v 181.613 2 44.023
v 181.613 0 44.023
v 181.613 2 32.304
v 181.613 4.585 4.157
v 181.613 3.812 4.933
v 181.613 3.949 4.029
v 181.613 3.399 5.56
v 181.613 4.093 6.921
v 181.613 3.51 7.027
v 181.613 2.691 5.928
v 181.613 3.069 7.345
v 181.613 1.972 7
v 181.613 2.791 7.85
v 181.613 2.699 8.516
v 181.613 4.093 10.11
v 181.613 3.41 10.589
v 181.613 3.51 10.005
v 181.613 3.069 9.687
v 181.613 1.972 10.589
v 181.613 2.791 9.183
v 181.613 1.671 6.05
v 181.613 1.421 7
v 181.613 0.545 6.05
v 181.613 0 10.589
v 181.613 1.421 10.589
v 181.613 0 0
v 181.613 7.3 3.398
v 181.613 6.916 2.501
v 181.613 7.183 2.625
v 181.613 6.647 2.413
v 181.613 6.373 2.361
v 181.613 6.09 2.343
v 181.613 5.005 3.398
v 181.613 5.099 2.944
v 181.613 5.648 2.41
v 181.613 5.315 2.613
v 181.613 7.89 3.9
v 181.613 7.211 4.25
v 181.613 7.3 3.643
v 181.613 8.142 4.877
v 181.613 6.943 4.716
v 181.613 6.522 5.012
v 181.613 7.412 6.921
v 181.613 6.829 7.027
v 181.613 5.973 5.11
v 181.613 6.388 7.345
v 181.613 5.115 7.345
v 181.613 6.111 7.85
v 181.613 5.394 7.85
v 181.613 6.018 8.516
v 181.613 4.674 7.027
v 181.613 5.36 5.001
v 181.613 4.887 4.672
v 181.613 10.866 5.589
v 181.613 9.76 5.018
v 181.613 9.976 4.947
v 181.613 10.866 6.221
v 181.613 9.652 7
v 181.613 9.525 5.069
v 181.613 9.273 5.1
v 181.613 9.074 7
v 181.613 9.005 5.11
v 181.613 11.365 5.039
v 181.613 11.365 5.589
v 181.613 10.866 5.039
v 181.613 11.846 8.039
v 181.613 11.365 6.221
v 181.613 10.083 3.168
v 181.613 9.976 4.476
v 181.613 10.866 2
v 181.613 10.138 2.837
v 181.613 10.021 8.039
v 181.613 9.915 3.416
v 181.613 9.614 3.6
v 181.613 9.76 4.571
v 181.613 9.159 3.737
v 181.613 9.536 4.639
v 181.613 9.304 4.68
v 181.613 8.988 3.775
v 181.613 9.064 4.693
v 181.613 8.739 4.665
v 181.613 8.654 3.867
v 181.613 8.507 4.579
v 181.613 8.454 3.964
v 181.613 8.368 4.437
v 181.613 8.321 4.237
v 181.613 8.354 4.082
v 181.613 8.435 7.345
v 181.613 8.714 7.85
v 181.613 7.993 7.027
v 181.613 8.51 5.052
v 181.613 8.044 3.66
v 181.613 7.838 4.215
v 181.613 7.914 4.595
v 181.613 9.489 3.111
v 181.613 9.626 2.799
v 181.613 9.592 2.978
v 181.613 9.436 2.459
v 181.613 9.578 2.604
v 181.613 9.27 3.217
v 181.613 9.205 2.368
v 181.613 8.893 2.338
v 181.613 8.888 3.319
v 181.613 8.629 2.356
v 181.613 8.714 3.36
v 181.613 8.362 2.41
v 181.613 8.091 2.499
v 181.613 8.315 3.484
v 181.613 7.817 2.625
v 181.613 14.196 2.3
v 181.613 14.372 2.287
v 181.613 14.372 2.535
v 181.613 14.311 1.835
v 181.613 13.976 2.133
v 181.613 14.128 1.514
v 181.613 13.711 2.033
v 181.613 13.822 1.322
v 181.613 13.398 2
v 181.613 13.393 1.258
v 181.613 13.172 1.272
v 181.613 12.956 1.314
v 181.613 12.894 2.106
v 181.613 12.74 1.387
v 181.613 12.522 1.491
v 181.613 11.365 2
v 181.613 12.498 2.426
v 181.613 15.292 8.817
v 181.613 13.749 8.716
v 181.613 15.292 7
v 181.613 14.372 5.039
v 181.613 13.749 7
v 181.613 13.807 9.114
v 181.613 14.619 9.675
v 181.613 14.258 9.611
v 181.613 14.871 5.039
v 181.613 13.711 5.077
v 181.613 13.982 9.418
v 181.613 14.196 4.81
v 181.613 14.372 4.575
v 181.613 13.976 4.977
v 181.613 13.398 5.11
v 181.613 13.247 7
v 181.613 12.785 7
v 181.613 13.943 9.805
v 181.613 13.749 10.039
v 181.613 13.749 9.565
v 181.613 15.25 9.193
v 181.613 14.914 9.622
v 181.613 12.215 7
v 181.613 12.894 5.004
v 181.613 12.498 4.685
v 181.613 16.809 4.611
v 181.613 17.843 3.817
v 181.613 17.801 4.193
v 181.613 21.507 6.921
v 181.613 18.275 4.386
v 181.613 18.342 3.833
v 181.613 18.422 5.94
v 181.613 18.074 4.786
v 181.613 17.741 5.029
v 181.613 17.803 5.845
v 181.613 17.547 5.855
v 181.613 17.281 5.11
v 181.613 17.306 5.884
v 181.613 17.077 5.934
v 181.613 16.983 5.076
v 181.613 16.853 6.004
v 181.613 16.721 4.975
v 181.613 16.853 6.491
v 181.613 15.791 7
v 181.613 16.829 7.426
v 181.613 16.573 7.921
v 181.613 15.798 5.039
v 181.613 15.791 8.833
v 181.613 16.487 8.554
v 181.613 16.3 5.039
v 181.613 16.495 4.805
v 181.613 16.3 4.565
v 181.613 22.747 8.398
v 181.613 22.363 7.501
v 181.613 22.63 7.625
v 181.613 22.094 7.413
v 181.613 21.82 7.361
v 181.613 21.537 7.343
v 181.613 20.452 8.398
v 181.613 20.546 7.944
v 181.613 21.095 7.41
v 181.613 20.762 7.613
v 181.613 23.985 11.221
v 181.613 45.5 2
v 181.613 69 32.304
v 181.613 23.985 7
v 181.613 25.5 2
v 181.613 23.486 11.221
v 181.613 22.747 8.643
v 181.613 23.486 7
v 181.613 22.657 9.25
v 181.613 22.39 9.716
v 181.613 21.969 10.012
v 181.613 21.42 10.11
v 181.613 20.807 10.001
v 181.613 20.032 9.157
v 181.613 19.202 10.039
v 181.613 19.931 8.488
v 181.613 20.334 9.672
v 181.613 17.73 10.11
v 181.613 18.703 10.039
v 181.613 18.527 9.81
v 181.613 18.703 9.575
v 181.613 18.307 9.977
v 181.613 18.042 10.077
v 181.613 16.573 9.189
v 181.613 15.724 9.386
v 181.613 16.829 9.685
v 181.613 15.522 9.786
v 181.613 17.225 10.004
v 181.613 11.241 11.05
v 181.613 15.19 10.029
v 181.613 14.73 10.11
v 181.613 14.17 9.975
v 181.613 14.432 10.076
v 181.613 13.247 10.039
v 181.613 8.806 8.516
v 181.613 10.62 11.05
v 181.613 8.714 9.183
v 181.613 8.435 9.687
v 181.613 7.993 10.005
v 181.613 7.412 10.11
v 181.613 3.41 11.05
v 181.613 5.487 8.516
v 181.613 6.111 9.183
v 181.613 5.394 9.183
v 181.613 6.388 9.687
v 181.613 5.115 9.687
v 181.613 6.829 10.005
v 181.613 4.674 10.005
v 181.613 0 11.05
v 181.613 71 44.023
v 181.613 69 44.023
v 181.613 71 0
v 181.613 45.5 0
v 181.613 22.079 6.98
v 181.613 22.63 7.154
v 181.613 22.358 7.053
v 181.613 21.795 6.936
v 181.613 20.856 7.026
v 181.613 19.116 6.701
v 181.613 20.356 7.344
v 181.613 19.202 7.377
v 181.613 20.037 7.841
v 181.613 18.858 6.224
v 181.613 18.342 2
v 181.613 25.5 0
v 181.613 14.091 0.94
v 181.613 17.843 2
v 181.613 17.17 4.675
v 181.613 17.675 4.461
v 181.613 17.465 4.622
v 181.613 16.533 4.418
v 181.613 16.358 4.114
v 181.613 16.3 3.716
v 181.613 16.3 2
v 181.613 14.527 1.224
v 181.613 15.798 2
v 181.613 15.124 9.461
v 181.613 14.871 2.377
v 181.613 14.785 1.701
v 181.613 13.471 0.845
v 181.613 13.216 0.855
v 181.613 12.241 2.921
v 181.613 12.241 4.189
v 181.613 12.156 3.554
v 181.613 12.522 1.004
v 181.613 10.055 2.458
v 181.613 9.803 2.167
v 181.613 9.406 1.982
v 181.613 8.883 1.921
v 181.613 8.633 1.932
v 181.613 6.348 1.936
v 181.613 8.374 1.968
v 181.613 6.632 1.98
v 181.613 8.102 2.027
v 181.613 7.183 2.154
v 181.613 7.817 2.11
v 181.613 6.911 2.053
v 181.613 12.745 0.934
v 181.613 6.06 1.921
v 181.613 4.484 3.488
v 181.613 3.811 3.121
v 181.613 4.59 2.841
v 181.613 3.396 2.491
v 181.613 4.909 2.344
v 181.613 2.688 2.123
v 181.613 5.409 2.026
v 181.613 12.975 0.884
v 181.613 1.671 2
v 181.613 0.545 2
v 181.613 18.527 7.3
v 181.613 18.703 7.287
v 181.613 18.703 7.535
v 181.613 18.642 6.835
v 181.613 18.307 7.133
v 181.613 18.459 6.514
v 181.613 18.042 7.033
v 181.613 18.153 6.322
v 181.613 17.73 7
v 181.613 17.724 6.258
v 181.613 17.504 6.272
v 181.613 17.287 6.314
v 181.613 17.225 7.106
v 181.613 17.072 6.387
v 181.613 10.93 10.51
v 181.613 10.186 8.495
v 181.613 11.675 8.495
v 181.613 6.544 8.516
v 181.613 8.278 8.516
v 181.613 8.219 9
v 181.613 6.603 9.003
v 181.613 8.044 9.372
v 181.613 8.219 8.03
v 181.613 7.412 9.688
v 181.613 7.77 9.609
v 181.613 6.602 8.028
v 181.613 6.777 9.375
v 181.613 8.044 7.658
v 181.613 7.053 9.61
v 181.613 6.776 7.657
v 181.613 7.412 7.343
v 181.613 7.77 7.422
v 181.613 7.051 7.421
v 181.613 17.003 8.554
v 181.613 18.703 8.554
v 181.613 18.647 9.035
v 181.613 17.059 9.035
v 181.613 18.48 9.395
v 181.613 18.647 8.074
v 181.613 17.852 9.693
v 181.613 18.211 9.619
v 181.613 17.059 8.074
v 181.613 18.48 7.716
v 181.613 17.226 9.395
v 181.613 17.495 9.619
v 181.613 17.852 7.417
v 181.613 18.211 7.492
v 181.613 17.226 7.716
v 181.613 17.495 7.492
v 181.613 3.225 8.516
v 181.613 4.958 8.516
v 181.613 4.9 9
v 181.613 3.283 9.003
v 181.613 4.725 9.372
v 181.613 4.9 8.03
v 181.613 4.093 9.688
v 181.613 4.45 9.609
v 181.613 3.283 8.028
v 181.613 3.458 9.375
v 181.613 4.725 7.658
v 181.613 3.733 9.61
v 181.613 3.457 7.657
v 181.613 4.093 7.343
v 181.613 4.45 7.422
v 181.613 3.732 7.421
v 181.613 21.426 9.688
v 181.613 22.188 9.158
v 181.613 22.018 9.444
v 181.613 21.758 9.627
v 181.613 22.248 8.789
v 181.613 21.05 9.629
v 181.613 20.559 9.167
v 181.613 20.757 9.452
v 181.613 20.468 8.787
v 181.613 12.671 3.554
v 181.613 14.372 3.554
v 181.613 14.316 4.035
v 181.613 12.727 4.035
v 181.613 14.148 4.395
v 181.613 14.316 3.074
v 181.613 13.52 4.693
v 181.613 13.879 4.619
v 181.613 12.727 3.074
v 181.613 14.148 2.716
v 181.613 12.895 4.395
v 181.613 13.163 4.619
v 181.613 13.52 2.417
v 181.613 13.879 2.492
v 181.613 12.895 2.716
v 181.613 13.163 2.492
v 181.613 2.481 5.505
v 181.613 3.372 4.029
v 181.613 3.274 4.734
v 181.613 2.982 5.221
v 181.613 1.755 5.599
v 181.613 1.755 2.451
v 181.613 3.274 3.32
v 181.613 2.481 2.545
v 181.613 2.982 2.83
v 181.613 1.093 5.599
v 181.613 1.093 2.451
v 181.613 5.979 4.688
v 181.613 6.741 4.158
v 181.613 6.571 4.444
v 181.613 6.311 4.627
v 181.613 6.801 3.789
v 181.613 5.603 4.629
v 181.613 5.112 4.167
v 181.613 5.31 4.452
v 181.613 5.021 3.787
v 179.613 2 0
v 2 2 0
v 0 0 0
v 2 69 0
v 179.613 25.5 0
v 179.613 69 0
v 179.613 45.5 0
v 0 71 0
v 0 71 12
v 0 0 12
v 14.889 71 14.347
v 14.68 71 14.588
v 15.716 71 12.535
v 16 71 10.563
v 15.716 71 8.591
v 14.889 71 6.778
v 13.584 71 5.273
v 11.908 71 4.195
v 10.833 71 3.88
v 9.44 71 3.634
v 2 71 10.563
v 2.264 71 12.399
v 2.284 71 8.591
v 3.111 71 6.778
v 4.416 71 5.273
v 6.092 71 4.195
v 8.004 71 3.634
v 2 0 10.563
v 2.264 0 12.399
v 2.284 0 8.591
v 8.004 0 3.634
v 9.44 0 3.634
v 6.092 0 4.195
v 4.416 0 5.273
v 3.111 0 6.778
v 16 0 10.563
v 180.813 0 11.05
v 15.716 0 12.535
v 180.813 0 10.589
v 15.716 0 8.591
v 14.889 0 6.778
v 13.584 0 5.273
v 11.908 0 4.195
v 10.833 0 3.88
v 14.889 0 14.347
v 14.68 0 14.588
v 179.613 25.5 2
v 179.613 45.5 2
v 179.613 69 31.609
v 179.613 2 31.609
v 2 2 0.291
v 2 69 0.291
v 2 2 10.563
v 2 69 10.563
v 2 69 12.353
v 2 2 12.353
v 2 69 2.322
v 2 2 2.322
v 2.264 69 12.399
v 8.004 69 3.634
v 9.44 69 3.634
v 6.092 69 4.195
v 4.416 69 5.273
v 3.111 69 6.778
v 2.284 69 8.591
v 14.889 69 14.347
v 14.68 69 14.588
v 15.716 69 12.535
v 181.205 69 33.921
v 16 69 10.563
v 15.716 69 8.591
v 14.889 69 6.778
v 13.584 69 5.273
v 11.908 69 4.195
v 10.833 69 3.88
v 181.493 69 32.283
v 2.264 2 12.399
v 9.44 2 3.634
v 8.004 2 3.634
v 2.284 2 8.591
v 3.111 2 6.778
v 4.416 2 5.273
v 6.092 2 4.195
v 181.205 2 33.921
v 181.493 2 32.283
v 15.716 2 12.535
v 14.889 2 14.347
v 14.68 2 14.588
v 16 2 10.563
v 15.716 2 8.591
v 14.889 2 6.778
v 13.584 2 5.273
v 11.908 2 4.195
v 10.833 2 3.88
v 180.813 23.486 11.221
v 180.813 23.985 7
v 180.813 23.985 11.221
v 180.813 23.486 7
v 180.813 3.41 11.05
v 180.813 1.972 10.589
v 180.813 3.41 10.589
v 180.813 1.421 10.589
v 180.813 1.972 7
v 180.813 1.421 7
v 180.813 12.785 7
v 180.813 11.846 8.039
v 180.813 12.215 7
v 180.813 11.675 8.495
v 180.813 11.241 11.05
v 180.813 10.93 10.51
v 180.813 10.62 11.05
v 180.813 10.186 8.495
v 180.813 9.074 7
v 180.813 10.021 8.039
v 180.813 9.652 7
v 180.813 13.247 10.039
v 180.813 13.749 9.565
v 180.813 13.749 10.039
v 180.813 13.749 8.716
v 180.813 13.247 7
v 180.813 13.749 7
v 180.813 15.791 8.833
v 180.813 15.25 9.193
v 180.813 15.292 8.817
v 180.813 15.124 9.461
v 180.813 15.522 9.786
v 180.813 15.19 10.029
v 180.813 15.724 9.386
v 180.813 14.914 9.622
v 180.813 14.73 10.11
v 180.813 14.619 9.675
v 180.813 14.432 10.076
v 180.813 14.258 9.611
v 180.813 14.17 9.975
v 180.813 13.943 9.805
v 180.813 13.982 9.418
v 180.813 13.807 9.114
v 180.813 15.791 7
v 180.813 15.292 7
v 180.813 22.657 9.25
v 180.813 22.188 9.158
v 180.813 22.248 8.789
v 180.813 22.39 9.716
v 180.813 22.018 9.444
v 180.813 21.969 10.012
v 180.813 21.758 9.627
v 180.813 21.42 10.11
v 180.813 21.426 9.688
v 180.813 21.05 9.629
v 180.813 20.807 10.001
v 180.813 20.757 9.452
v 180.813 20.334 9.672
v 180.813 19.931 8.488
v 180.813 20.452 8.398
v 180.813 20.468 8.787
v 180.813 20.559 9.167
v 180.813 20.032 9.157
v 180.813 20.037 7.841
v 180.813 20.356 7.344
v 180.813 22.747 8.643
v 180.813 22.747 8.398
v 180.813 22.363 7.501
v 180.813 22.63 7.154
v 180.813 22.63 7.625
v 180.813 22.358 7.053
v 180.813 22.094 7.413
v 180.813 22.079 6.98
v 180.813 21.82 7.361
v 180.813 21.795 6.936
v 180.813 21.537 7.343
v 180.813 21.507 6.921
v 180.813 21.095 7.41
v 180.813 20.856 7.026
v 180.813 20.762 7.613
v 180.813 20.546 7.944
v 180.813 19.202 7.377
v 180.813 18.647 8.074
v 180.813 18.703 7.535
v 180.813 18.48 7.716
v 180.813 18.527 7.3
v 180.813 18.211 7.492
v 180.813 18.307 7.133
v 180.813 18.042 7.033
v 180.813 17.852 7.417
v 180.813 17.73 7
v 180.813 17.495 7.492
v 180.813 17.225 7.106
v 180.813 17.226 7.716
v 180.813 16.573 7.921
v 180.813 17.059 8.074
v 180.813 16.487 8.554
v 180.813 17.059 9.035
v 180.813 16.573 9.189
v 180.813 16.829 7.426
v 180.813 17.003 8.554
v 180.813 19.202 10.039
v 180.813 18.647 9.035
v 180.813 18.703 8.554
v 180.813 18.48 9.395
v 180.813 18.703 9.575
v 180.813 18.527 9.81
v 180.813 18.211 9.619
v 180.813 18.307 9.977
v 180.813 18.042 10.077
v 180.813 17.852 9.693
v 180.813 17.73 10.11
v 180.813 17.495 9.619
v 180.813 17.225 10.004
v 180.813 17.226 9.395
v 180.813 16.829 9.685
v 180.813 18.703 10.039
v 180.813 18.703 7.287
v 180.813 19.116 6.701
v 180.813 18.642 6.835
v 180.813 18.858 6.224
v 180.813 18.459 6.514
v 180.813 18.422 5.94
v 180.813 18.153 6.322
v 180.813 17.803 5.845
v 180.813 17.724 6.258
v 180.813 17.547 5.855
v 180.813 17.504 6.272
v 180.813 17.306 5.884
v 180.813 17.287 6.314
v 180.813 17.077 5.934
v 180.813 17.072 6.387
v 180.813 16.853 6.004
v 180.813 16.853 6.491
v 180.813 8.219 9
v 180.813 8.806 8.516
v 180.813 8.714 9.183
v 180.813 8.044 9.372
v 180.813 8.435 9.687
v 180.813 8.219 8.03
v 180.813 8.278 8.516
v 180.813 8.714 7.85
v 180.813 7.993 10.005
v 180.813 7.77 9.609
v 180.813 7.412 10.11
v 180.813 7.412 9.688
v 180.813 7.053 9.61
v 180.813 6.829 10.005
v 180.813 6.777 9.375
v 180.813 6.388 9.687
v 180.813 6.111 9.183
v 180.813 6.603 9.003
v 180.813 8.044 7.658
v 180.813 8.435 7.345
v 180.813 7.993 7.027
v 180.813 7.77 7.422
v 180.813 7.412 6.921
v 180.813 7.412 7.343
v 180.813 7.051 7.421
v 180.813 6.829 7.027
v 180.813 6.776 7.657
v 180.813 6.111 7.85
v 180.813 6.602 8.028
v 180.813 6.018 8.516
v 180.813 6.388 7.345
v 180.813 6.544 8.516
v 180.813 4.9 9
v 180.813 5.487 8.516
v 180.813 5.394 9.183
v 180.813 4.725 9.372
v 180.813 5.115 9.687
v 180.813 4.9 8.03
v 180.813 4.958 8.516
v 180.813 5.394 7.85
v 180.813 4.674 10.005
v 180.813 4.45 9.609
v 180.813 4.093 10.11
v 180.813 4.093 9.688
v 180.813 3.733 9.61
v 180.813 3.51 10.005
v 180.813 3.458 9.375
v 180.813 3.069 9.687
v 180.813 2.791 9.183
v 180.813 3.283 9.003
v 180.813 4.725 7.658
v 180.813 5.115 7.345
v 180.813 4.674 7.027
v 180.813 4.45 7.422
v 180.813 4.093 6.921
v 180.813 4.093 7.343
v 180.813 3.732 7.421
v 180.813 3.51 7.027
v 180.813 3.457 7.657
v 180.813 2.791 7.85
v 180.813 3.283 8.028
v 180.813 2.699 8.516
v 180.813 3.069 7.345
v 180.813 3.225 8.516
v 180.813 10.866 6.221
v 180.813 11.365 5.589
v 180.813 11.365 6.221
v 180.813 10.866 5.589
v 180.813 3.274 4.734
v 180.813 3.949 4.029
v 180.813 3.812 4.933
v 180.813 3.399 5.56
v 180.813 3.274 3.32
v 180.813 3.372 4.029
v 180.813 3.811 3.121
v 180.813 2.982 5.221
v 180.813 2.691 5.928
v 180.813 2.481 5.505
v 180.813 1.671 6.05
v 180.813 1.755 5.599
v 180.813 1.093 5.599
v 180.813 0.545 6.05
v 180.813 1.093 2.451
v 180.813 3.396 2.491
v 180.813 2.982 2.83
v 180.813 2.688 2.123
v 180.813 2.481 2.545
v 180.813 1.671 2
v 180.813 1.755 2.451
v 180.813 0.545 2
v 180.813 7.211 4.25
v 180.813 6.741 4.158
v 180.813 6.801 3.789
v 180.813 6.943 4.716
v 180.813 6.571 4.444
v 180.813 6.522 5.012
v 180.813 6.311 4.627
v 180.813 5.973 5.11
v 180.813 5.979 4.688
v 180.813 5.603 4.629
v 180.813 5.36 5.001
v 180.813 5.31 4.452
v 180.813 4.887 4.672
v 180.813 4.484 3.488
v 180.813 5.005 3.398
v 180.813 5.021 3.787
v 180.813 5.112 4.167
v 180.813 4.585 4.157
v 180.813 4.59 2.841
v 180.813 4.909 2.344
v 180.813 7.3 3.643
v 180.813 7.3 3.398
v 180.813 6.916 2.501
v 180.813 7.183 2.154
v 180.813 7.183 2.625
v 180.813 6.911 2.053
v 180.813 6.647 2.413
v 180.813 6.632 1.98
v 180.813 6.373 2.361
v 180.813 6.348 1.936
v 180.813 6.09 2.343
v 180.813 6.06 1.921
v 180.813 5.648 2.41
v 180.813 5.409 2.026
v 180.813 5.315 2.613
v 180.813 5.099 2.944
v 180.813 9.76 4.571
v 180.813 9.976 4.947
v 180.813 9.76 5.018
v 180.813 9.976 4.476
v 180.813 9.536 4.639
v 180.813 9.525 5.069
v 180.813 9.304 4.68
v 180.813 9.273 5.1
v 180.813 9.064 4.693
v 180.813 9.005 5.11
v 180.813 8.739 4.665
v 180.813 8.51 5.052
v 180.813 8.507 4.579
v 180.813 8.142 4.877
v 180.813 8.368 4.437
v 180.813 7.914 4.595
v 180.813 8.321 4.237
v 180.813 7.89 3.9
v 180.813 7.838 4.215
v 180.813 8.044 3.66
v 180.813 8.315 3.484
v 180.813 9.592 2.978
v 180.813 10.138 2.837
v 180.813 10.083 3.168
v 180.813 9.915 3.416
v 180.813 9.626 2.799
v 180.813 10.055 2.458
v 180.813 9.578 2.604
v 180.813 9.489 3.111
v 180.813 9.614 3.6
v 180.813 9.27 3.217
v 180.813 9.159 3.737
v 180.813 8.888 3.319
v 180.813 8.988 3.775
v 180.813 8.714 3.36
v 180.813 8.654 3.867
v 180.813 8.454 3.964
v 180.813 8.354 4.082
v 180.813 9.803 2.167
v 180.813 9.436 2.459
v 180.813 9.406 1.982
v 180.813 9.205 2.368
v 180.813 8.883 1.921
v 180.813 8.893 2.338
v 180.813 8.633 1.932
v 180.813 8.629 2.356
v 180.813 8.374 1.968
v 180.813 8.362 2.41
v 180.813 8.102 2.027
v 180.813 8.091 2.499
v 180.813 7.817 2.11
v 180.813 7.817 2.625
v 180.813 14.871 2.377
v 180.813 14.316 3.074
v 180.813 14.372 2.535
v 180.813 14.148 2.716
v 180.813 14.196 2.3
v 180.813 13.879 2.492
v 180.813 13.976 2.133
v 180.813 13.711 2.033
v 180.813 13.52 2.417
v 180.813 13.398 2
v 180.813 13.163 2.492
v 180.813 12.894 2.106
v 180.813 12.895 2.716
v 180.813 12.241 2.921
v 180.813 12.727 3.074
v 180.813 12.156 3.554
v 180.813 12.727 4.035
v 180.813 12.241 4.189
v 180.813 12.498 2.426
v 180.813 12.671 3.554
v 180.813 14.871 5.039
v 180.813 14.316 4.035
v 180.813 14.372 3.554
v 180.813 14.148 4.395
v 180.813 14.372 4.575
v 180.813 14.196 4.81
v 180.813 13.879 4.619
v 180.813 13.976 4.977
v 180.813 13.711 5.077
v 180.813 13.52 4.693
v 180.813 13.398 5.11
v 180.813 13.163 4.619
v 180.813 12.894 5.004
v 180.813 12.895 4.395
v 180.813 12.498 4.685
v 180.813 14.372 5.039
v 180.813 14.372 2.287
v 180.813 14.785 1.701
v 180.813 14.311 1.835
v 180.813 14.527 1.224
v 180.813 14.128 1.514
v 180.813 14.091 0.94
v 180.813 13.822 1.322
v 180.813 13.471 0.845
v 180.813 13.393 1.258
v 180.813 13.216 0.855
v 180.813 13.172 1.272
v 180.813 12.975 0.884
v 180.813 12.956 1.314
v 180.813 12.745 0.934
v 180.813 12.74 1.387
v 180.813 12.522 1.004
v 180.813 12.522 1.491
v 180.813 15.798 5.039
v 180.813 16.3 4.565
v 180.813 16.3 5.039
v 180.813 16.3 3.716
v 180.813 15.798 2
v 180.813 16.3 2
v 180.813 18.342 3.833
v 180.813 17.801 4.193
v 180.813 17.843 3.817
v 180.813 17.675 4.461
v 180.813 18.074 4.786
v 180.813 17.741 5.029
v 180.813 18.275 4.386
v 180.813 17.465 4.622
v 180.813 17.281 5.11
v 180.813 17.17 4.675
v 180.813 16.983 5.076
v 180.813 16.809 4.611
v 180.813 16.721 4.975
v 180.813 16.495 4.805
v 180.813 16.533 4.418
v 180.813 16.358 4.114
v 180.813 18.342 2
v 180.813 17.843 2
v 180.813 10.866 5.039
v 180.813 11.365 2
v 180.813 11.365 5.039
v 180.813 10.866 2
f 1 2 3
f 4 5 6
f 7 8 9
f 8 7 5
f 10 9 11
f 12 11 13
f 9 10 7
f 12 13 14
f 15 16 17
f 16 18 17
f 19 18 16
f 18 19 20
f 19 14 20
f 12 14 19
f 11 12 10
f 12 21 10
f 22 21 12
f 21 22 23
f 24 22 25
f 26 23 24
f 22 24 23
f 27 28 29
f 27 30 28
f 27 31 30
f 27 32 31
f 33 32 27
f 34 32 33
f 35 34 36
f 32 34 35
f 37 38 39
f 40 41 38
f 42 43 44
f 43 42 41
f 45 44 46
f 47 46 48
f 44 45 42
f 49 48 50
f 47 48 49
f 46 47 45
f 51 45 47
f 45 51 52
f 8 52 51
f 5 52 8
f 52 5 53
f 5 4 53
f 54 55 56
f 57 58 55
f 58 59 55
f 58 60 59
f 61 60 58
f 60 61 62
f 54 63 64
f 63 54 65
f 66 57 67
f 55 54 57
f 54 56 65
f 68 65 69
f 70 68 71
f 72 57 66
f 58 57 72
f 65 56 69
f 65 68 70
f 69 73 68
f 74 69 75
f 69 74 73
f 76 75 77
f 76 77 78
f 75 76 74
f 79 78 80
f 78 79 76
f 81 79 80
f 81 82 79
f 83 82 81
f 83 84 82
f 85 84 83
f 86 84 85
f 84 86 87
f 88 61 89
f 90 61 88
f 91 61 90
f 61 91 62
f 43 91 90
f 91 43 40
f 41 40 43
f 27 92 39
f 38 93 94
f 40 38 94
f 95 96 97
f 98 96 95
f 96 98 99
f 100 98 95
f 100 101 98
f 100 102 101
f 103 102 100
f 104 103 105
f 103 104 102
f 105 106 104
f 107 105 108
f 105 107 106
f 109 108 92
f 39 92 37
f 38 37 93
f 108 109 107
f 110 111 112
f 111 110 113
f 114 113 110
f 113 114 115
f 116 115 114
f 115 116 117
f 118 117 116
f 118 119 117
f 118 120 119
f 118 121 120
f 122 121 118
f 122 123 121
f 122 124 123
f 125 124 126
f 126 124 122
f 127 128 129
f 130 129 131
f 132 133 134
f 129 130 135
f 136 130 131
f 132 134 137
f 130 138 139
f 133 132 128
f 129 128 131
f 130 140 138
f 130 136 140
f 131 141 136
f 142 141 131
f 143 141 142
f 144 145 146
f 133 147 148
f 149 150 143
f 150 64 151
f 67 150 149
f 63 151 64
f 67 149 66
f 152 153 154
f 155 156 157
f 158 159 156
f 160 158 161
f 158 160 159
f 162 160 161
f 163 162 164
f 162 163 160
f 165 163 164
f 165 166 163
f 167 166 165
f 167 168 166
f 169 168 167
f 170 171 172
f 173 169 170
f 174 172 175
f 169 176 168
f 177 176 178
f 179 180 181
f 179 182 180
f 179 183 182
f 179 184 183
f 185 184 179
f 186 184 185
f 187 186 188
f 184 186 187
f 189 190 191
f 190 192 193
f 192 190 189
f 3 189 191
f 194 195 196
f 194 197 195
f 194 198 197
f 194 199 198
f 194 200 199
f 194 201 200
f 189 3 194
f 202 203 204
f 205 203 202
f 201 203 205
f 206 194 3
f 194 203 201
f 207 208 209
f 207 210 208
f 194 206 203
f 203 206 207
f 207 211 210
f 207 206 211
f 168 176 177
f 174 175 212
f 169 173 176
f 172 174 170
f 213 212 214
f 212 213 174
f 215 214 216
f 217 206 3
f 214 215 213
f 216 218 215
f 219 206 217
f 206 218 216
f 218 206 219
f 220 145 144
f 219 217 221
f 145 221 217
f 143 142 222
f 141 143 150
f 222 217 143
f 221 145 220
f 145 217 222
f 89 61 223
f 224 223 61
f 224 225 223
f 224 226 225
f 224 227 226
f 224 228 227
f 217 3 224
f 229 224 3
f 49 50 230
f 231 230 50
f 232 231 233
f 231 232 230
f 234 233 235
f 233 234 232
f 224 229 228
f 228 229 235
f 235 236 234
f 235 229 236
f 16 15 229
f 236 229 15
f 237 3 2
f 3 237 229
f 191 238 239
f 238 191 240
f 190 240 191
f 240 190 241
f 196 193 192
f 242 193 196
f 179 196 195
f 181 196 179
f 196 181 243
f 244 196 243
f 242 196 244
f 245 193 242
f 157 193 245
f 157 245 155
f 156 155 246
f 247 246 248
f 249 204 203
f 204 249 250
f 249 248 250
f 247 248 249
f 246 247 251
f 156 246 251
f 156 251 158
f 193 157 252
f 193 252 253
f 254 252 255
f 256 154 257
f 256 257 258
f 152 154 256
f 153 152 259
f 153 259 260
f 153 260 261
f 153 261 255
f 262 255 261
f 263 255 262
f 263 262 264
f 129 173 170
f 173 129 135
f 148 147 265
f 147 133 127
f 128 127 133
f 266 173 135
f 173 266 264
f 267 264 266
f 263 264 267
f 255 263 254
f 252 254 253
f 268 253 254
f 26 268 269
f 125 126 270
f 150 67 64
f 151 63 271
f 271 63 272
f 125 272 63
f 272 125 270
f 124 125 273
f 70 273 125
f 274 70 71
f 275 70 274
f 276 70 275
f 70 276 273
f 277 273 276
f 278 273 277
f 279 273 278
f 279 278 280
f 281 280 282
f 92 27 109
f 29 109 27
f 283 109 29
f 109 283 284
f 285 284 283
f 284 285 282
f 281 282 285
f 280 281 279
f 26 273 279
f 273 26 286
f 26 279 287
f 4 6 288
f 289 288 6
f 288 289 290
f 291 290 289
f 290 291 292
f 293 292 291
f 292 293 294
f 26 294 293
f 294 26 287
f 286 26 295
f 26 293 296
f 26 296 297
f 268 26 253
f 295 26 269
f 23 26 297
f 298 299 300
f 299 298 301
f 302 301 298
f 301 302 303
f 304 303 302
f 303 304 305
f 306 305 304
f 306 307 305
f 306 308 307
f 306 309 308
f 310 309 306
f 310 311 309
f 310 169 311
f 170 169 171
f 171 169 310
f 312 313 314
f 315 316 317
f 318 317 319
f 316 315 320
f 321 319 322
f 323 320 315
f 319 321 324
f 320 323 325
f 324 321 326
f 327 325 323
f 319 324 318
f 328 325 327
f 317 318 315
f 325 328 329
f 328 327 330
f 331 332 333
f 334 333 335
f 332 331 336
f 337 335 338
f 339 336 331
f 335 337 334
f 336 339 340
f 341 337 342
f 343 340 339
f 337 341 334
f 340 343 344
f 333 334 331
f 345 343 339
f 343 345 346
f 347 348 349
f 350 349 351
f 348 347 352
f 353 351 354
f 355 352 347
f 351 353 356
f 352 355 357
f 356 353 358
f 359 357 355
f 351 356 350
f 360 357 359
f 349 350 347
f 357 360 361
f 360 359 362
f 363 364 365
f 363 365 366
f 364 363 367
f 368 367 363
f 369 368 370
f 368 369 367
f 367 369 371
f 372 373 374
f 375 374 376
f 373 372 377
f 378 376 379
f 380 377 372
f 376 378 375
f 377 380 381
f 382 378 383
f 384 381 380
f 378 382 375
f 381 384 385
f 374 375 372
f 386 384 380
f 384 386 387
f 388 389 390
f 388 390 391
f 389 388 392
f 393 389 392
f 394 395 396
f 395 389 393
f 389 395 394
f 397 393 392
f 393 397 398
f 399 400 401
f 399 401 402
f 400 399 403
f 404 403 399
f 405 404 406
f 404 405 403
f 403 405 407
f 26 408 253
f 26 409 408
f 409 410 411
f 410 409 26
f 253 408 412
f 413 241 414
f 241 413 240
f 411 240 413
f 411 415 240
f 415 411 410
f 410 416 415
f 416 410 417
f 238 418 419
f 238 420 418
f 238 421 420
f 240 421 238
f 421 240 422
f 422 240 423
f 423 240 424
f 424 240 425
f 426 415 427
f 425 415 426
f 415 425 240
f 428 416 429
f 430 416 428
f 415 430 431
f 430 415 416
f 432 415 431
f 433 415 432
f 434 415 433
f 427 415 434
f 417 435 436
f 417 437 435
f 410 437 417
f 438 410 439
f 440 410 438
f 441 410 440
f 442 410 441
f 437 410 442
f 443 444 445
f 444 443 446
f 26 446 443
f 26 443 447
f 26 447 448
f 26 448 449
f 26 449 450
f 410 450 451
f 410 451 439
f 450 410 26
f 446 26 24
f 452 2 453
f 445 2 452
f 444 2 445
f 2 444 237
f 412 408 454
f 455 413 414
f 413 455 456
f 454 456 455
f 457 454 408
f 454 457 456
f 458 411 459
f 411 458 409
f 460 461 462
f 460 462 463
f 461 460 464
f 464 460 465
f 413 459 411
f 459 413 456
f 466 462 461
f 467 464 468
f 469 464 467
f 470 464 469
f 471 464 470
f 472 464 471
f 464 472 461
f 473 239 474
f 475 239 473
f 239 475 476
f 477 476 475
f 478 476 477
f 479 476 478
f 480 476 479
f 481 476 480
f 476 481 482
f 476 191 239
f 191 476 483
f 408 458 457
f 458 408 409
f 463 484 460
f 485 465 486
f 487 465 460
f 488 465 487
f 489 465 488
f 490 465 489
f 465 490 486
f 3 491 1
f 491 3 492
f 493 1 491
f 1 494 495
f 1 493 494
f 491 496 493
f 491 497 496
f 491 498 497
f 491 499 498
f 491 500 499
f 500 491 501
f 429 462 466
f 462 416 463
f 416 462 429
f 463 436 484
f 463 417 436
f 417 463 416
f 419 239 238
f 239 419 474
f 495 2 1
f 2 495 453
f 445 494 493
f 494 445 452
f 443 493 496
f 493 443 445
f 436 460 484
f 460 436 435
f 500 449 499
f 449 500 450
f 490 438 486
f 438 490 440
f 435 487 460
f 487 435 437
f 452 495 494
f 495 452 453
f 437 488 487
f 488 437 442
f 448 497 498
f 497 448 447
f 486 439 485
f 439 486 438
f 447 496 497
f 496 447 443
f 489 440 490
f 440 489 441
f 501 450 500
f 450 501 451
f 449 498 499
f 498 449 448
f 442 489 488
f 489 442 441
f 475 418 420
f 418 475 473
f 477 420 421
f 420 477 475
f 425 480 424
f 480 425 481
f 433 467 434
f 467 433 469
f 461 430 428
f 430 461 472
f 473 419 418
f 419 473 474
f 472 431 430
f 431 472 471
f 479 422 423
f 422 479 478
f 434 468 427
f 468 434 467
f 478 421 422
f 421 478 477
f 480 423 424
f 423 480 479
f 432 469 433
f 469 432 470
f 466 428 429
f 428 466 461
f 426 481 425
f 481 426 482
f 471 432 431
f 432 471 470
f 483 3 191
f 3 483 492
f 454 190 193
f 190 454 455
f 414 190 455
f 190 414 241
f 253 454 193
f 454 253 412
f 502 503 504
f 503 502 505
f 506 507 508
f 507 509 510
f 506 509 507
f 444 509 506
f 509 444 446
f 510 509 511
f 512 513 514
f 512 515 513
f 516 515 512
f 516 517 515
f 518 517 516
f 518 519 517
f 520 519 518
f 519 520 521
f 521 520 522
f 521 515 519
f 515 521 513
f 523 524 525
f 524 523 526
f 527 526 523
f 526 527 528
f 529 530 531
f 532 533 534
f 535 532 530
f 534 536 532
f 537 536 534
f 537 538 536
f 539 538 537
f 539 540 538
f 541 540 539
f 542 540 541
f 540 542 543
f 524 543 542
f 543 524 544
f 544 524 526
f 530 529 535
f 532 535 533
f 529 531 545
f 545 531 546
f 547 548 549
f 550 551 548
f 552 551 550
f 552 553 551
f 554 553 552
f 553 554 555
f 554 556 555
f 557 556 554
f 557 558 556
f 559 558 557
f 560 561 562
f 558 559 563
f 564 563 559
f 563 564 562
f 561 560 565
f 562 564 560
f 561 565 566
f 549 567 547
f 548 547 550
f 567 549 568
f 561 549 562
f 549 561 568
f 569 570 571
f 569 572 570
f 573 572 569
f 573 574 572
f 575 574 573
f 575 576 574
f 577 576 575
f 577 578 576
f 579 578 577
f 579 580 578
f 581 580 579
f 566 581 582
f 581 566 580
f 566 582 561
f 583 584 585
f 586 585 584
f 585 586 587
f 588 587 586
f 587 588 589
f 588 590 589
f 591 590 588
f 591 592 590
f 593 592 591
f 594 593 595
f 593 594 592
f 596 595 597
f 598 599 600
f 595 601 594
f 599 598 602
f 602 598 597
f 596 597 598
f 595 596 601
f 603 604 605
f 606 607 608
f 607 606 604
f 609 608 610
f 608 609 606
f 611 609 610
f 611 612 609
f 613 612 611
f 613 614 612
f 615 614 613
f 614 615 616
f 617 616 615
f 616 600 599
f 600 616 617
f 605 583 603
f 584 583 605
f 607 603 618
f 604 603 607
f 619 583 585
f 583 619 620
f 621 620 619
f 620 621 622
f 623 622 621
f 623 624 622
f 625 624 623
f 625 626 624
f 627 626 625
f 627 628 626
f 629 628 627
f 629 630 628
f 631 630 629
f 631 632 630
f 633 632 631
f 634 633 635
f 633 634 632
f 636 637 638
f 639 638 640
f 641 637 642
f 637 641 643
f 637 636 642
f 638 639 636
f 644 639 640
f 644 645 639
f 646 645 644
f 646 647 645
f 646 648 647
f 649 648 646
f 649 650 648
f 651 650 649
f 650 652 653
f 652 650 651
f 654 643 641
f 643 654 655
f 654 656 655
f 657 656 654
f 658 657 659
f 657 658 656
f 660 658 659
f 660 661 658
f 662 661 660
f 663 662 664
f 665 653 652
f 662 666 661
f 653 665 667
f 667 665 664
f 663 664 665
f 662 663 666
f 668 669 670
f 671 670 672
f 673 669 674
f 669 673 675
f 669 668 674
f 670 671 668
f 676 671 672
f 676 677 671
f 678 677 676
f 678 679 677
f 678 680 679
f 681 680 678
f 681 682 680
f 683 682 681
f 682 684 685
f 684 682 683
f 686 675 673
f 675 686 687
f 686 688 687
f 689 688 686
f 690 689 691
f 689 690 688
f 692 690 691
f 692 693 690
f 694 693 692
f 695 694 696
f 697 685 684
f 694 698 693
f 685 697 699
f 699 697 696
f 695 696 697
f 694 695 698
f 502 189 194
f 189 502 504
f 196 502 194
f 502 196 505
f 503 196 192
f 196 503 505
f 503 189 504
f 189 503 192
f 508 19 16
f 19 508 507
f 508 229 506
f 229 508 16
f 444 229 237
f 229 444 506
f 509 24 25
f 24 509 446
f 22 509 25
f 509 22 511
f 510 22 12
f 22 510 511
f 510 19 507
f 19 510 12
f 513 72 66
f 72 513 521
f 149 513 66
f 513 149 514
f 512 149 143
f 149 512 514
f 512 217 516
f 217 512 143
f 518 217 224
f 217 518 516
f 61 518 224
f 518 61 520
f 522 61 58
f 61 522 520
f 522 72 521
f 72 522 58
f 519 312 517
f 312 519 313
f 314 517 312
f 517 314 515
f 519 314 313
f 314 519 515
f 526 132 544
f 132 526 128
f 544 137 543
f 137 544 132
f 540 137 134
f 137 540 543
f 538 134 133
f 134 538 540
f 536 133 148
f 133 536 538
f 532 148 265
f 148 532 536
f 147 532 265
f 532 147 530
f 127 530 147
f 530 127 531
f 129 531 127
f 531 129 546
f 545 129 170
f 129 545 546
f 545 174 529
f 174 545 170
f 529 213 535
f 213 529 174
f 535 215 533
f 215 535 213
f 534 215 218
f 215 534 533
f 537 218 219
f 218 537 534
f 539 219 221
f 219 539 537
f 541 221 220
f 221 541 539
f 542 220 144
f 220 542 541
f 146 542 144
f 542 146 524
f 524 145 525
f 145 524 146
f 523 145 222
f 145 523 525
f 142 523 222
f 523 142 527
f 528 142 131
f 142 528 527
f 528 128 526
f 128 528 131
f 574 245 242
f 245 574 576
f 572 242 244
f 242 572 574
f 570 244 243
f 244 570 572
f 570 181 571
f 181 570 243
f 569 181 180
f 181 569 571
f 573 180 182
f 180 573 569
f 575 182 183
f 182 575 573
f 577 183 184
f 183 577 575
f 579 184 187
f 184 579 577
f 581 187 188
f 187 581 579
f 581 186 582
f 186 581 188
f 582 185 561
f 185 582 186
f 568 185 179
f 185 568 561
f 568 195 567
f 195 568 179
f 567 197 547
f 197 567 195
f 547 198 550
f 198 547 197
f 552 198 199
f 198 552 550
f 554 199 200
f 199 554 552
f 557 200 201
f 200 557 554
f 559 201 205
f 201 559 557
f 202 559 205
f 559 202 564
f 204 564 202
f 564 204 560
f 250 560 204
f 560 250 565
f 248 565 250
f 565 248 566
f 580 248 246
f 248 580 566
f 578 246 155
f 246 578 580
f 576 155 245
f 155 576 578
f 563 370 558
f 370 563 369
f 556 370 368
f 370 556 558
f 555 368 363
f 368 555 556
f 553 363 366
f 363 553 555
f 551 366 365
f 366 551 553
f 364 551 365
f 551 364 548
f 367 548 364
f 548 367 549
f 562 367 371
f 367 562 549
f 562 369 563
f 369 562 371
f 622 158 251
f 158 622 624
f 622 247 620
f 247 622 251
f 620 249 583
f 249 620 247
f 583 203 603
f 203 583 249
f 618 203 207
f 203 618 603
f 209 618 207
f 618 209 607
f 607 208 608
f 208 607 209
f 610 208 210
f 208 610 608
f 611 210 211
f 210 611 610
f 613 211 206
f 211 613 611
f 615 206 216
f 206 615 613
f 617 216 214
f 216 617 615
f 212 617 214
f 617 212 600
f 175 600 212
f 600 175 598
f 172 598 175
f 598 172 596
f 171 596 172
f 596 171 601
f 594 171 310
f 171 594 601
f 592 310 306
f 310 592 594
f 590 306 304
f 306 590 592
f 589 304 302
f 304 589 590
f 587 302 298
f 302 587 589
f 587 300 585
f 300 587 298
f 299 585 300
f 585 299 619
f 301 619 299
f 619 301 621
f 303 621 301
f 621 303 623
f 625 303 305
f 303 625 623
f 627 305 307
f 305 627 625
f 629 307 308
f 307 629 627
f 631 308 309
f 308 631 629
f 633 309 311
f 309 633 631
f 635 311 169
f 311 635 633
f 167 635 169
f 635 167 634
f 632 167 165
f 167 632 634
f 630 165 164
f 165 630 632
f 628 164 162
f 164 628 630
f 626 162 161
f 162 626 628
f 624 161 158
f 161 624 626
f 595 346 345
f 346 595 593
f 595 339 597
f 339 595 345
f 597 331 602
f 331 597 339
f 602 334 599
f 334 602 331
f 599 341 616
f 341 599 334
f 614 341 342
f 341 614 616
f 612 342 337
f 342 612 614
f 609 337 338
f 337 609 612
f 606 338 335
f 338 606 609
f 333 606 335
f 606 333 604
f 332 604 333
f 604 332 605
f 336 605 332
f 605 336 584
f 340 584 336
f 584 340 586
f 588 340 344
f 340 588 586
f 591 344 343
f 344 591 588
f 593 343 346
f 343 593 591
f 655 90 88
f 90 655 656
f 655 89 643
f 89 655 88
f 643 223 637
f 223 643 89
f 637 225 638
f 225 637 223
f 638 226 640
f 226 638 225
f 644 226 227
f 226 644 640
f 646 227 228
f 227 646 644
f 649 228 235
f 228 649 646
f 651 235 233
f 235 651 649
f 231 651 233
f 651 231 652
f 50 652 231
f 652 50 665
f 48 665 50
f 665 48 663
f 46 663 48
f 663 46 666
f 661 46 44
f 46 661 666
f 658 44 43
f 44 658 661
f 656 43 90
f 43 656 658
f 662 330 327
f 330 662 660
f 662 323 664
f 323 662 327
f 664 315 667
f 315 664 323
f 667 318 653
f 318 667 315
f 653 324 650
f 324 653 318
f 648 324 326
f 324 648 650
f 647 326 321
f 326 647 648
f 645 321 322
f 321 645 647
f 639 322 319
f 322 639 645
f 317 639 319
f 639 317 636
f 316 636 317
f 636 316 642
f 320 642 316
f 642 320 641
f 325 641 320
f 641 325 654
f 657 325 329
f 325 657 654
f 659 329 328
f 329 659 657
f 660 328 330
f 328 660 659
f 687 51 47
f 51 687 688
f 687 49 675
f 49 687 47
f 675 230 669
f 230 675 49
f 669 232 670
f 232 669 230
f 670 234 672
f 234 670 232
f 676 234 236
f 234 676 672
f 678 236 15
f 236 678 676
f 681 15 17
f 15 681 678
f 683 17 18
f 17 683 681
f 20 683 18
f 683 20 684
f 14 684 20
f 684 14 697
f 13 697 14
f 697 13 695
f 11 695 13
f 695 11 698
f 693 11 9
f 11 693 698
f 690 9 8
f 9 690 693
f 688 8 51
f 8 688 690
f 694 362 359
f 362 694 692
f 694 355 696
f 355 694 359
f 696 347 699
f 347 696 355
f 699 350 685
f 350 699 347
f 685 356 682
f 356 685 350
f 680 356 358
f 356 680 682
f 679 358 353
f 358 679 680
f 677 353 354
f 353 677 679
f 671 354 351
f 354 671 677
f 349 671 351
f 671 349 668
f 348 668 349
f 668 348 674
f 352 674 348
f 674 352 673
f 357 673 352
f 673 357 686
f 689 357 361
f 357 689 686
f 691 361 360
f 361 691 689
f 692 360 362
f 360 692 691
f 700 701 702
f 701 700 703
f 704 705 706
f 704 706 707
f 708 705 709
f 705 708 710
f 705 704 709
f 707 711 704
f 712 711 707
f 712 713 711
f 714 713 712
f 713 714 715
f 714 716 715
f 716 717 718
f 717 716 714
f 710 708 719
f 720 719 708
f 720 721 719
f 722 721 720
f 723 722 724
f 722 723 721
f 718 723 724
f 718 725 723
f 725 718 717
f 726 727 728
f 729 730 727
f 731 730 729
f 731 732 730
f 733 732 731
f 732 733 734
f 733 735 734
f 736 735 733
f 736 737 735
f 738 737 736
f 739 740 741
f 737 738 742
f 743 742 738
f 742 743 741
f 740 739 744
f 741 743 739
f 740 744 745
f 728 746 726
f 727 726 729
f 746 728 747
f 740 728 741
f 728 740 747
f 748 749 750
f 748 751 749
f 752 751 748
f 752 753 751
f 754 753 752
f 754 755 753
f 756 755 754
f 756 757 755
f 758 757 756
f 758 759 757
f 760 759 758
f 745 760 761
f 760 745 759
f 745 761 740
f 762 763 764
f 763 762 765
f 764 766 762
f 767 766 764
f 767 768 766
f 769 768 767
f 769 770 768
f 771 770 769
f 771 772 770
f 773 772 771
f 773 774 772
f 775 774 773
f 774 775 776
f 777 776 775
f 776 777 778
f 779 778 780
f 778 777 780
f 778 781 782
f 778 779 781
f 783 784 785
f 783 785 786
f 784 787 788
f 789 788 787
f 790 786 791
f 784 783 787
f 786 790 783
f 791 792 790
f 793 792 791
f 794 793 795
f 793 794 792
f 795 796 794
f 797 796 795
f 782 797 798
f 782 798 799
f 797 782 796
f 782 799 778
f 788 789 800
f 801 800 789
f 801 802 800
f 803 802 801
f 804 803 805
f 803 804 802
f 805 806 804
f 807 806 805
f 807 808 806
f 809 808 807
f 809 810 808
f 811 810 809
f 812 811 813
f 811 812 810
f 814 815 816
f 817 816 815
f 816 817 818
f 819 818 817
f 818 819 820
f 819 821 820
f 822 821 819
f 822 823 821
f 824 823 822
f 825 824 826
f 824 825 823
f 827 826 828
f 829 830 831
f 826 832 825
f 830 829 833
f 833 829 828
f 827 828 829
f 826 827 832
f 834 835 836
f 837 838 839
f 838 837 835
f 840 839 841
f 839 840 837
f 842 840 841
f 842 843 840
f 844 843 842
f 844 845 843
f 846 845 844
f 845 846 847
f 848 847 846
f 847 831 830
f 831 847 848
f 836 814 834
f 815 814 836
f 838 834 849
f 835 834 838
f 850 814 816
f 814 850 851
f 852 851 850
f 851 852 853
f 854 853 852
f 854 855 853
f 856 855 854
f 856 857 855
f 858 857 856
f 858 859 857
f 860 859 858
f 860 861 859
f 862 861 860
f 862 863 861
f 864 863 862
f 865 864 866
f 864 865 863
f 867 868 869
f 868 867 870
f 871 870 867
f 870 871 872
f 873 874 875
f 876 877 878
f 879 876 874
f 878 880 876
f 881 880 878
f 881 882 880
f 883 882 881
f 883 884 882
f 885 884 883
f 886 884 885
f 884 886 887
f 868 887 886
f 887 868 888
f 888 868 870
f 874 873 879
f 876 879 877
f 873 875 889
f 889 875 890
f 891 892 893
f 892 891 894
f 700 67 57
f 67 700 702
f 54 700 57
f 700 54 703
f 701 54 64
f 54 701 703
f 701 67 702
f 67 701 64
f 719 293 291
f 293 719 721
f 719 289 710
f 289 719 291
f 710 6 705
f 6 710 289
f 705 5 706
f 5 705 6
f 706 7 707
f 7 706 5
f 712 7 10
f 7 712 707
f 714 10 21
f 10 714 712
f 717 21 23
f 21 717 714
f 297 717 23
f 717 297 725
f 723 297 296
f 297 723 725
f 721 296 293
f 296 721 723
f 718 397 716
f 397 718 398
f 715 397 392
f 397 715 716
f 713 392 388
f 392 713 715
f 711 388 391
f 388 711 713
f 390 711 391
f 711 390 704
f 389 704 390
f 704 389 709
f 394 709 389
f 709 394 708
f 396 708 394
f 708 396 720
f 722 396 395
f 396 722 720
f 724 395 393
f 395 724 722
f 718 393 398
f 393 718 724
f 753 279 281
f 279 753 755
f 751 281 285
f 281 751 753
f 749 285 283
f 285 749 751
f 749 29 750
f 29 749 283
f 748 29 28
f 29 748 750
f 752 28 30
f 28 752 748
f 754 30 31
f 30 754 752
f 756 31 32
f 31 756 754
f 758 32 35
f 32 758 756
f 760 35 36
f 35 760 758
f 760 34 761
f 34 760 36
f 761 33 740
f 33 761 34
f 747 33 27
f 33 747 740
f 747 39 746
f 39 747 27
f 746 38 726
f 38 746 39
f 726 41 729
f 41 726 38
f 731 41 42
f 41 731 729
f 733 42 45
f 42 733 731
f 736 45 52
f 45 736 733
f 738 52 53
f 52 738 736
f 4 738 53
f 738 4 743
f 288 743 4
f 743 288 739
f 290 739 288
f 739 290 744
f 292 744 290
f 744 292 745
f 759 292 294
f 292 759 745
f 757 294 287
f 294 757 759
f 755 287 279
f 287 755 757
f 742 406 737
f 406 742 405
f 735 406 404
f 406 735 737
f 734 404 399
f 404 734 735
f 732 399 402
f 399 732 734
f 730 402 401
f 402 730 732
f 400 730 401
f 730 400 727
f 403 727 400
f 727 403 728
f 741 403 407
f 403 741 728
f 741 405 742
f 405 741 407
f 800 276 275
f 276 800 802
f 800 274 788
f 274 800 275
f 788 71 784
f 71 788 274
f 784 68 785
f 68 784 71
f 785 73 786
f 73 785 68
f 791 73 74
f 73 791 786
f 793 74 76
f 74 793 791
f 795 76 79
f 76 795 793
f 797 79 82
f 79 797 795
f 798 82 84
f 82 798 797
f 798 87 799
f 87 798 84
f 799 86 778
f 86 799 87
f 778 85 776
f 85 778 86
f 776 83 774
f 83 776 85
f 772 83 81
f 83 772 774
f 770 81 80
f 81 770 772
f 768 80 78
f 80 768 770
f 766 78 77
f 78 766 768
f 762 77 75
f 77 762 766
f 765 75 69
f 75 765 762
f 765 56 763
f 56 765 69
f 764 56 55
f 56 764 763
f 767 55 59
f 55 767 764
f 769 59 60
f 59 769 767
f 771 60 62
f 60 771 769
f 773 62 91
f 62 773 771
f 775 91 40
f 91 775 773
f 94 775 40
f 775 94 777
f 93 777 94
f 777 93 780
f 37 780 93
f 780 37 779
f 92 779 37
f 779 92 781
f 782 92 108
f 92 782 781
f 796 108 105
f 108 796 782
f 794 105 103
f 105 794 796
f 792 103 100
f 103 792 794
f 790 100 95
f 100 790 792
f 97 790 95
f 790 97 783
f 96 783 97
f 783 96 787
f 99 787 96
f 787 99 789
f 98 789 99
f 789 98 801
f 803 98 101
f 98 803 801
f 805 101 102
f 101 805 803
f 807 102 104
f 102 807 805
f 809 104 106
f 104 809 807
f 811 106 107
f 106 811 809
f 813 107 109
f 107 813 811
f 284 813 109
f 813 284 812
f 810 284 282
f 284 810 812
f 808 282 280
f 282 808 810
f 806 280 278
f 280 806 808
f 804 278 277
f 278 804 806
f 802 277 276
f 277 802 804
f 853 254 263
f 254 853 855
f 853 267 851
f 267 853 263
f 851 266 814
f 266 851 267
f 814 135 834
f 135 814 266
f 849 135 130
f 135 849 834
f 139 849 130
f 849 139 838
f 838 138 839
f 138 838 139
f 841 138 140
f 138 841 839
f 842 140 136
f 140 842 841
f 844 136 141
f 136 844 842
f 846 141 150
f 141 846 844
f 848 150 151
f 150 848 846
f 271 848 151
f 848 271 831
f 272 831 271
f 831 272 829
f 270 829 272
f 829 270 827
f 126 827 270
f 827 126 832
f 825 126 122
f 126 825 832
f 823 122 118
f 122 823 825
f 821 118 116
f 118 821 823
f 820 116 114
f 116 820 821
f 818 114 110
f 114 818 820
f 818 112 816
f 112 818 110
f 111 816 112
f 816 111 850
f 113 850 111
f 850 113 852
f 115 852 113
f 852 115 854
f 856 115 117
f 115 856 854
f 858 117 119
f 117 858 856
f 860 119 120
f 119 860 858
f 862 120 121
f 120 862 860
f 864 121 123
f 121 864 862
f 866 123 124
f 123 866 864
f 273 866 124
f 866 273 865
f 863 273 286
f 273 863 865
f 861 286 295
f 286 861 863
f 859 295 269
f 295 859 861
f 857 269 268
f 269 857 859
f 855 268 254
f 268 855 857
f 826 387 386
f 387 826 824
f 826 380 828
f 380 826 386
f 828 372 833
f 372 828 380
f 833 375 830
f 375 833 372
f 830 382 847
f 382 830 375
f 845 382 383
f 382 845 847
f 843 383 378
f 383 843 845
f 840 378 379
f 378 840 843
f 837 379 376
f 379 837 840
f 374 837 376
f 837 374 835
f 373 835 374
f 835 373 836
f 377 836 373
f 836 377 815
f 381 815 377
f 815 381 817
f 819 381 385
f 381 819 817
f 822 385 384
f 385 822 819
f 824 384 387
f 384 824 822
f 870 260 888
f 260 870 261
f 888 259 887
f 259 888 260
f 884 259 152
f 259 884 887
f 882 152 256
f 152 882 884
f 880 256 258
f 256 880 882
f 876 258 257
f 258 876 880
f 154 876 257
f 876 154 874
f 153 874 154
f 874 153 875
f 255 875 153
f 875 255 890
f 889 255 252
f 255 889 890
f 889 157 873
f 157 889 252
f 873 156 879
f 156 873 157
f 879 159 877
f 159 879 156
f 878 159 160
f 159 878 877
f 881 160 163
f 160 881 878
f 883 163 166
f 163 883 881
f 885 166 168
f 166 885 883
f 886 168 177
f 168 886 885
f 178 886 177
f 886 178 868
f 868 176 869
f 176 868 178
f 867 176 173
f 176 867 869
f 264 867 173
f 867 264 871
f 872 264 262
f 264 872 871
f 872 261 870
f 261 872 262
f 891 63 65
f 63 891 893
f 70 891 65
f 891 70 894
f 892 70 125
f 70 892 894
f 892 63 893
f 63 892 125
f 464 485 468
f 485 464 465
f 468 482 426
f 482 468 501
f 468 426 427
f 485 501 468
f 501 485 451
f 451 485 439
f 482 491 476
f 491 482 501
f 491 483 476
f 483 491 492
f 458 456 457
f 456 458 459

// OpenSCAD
accus = 10;
gradient = 10;
accu_diameter = 18; 
accu_length = 67; // 65 plus padding
thickness = 2;


length = accus * accu_diameter;

// Height
// sin alpha = opposite / hypothenuse
// height = length * sin gradient
height = length * sin(gradient);
echo("Height: ", height);

// Base offset
// Due to different ankle
// sin alpha = opposite / hypothenuse
// base_offset = thickness * sin gradient
base_offset = thickness * sin(gradient);
echo("Base offset: ", base_offset);

// Case length
// cos alpha = adjacent / hypothenuse
// case_length = length * cos gradient
case_length = length * cos(gradient) + base_offset;
echo("Case length: ", case_length);

// Grip offset
// sin alpha = opposite / hypothenuse
// grip_offset = accu_diameter / 2 * sin gradient
grip_offset = accu_diameter / 2 * sin(gradient);
echo("Grip offset: ", grip_offset);

back_height = sin(gradient) * (length + 2 * thickness);

hook_length = 20;


// Case
difference() {
    cube([case_length + 2 * thickness, accu_length + 2 * thickness, height + accu_diameter]);
    translate([thickness, thickness, 0]) cube([case_length, accu_length, height + accu_diameter]);
    translate([0, 0, accu_diameter / 1.5]) rotate([0, -gradient, 0]) cube([length + 2 * thickness + 10, accu_length + 2 * thickness, height + 10]);
    translate([accu_diameter / 2, 1.5 * thickness, accu_diameter / 2 + grip_offset]) rotate([90, 0, 0]) cylinder(2 * thickness, r = accu_diameter / 2 - 2);
    translate([accu_diameter / 2, accu_length + 2.5 * thickness, accu_diameter / 2 + grip_offset]) rotate([90, 0, 0]) cylinder(2 * thickness, r = accu_diameter / 2 - 2);

    // Remove Upper border
    translate([thickness + case_length, thickness, back_height]) rotate([0, -gradient, 0]) cube([5 * thickness, accu_length, accu_diameter]);    

    // hole for hook
    translate([case_length + thickness, (accu_length + 2 * thickness) / 2 - hook_length / 2, 0]) cube([thickness, hook_length, thickness]);

    
    translate([case_length + 1.6 * thickness, 0, 7]) rotate([90, 0, 90]) linear_extrude(thickness / 2) text("TooAngel", size=4, font="Deftone Stylus:style=Regular");
    translate([case_length + 1.6 * thickness, 0, 2]) rotate([90, 0, 90]) linear_extrude(thickness / 2) text("Design", size=4, font="Deftone Stylus:style=Regular");
}


// Base
translate([base_offset, 0, 0]) rotate([0, -gradient, 0]) cube([length + 2 * thickness, accu_length + 2 * thickness, thickness]);
